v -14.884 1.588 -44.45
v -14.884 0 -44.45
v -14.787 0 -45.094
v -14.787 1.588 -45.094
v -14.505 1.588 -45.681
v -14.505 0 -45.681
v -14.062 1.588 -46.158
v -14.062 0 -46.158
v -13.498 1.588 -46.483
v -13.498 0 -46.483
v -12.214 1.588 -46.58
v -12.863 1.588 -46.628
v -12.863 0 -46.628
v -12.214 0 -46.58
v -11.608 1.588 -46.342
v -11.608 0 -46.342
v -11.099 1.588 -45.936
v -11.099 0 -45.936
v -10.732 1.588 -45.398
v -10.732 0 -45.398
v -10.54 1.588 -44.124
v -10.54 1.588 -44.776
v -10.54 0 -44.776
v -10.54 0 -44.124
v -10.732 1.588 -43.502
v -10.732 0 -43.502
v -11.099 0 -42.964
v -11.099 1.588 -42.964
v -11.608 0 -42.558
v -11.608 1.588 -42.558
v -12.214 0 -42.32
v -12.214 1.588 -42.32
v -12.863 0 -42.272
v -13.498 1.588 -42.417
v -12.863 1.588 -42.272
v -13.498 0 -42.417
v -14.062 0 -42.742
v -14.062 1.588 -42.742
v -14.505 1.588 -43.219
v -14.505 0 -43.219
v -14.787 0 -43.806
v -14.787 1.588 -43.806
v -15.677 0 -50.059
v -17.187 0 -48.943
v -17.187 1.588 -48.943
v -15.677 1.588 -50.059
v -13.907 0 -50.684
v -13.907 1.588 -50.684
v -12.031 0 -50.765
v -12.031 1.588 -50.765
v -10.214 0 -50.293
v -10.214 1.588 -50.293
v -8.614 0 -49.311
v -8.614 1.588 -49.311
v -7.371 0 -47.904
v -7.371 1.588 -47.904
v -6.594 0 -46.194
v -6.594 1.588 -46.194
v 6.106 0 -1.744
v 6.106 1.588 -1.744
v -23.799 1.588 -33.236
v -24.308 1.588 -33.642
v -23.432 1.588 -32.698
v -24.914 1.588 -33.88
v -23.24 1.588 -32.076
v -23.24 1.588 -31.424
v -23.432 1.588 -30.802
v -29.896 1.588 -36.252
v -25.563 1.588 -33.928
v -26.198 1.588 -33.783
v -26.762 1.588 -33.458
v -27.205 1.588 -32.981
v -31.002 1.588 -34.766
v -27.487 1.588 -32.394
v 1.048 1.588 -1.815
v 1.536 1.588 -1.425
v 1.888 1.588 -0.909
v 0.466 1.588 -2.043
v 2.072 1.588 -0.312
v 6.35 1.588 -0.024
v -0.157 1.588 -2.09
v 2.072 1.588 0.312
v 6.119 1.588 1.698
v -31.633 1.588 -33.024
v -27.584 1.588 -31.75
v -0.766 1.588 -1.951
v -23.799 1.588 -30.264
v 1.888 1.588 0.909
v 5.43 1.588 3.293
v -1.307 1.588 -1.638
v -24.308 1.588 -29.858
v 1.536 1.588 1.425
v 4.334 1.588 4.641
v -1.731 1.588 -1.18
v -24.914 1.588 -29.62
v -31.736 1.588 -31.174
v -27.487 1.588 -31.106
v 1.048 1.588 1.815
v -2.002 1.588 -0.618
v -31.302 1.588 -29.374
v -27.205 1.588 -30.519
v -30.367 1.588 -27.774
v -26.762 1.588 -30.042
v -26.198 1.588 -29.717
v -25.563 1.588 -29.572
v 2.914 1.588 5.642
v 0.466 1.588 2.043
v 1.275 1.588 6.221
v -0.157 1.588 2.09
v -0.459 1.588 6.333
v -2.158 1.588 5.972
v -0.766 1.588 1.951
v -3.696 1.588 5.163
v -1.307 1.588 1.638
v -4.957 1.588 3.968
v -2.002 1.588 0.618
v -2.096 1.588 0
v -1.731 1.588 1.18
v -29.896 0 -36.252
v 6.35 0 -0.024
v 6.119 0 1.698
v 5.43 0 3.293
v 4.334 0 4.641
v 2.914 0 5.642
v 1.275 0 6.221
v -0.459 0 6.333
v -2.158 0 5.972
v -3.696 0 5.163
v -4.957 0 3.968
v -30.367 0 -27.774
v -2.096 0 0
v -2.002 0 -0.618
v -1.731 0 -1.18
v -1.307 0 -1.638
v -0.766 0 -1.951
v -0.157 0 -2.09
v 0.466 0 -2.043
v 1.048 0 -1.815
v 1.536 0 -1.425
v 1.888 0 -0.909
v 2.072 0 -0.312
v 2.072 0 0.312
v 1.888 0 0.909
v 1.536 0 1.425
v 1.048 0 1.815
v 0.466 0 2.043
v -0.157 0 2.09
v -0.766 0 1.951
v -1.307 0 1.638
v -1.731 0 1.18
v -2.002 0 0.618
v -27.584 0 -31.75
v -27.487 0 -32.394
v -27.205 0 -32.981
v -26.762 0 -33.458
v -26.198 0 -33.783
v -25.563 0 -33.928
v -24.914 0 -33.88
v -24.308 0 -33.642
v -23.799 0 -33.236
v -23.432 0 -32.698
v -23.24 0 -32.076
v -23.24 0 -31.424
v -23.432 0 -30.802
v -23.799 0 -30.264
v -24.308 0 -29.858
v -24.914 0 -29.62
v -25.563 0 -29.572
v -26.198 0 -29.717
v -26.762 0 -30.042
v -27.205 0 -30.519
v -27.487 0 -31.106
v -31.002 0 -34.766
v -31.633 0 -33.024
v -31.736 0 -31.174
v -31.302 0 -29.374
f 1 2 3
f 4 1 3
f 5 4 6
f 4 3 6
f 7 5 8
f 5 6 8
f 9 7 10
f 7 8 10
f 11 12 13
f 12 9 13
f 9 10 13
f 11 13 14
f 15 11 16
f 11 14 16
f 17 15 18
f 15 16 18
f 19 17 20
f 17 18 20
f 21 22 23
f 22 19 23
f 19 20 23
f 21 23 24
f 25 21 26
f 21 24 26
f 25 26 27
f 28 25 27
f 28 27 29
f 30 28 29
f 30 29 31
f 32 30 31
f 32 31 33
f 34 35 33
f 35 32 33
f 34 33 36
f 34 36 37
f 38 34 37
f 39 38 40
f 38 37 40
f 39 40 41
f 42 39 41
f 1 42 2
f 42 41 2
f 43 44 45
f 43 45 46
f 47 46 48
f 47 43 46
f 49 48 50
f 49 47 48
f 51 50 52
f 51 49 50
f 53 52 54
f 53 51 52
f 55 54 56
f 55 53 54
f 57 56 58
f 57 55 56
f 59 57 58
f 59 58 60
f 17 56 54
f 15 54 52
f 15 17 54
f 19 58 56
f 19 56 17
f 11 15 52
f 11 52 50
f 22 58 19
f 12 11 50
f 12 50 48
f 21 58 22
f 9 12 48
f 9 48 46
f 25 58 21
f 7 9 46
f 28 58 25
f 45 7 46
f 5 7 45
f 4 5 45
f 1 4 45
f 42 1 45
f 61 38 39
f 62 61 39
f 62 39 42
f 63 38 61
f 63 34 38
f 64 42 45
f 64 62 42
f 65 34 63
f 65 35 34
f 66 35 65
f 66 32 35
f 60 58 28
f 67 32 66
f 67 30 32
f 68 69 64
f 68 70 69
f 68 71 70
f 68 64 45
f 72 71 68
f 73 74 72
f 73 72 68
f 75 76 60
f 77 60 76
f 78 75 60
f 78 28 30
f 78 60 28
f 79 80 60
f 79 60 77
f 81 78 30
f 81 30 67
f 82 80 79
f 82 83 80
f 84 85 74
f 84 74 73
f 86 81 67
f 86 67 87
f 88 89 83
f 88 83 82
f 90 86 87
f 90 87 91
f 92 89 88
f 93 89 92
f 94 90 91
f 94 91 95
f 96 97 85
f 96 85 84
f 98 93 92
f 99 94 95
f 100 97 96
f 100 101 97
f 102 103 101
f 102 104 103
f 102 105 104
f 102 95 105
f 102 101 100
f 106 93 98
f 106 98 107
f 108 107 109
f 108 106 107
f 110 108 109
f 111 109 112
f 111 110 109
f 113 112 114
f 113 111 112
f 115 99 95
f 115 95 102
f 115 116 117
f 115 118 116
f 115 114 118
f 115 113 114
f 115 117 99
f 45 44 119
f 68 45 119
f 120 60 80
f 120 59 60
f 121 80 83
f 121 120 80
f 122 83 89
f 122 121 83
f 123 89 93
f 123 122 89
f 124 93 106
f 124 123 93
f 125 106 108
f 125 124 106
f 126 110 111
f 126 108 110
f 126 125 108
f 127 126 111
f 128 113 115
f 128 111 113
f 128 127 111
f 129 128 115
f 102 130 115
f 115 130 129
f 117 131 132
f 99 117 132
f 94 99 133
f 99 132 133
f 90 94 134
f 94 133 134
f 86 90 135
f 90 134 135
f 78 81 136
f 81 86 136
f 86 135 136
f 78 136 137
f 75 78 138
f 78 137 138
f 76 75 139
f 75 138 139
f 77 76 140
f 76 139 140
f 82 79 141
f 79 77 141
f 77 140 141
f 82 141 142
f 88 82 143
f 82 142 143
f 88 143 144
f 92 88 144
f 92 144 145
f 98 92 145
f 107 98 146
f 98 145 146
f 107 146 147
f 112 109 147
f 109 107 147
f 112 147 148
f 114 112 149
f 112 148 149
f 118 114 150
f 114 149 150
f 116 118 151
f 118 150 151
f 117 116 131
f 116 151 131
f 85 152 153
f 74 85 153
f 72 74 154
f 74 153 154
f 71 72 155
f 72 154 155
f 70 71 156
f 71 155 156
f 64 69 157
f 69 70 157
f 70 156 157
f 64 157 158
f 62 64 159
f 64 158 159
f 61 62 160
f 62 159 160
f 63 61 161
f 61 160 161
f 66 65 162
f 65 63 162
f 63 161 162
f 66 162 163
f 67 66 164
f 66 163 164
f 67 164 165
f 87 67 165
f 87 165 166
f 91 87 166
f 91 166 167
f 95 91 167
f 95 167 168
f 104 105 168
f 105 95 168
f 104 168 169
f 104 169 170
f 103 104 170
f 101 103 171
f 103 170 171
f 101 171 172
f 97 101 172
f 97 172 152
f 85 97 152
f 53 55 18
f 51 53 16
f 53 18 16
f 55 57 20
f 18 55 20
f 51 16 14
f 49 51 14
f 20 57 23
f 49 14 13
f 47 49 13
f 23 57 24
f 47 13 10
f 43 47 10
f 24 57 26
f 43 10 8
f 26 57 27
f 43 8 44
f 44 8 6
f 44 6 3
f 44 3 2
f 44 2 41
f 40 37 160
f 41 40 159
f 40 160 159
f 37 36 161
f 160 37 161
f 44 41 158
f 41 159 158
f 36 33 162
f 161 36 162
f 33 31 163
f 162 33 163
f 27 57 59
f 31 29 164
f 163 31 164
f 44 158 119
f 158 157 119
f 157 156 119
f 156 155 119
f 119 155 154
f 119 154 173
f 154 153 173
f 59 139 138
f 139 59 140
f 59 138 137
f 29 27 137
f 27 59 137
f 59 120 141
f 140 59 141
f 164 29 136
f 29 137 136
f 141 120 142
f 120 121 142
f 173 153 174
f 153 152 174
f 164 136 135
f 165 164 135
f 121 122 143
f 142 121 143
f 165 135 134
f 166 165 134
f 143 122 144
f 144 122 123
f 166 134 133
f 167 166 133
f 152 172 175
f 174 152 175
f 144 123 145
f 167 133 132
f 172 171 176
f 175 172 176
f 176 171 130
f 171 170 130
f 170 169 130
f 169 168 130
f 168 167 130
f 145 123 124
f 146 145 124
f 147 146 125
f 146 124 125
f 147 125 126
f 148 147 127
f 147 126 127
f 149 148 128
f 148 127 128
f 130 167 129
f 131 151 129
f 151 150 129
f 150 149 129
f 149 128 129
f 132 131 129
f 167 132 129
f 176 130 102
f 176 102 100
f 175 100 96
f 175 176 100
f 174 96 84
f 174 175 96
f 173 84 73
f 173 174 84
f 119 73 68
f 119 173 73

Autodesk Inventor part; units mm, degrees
ref_plane "YZ Plane" through (0, 0, 0) normal (1, 0, 0) x (0, 1, 0)
ref_plane "XZ Plane" through (0, 0, 0) normal (0, 1, 0) x (-1, 0, 0)
ref_plane "XY Plane" through (0, 0, 0) normal (0, 0, 1) x (1, 0, 0)
sketch "main" plane through (0, 0, 0) normal (0, 0, 1) x (1, 0, 0)
  circle A0 centre (7.7194, -42.2476) radius 2.1844
  circle A1 centre (20.4194, -29.5476) radius 2.1844
  circle A2 centre (-4.9806, 2.2024) radius 2.0955
  arc A3 (-0.0233, 6.1707) -> (-11.0863, 0.4579) centre (-4.9806, 2.2024) ccw
  arc A4 (1.6137, -43.9921) -> (12.2065, -46.7408) centre (7.7194, -42.2476) ccw
  arc A5 (24.9151, -34.0494) -> (25.3862, -25.5717) centre (20.4194, -29.5476) ccw
  line L0 (12.2065, -46.7408) -> (24.9151, -34.0494)
  line L1 (1.6137, -43.9921) -> (-11.0863, 0.4579)
  line L2 (25.3862, -25.5717) -> (-0.0233, 6.1707)
  point P0 (8.3889, -23.6516)
  dimension "d0" = 12.7
  dimension "d1" = 12.7
sketch "Sketch1" plane through (0, 0, 0) normal (0, 1, 0) x (-1, 0, 0)
  circle A0 centre (12.7, -44.45) radius 2.1844
  circle A1 centre (25.4, -31.75) radius 2.1844
  circle A2 centre (0, 0) radius 2.0955
  arc A3 (4.9573, 3.9683) -> (-6.1057, -1.7445) centre (0, 0) ccw
  arc A4 (6.5943, -46.1945) -> (17.1871, -48.9432) centre (12.7, -44.45) ccw
  arc A5 (29.8957, -36.2518) -> (30.3668, -27.7741) centre (25.4, -31.75) ccw
  line L0 (17.1871, -48.9432) -> (29.8957, -36.2518)
  line L1 (6.5943, -46.1945) -> (-6.1057, -1.7445)
  line L2 (30.3668, -27.7741) -> (4.9573, 3.9683)
extrude "Extrusion1" add sketch "Sketch1" along normal blind 1.5875
properties part number "gusset" material "Acetal Resin, White"
